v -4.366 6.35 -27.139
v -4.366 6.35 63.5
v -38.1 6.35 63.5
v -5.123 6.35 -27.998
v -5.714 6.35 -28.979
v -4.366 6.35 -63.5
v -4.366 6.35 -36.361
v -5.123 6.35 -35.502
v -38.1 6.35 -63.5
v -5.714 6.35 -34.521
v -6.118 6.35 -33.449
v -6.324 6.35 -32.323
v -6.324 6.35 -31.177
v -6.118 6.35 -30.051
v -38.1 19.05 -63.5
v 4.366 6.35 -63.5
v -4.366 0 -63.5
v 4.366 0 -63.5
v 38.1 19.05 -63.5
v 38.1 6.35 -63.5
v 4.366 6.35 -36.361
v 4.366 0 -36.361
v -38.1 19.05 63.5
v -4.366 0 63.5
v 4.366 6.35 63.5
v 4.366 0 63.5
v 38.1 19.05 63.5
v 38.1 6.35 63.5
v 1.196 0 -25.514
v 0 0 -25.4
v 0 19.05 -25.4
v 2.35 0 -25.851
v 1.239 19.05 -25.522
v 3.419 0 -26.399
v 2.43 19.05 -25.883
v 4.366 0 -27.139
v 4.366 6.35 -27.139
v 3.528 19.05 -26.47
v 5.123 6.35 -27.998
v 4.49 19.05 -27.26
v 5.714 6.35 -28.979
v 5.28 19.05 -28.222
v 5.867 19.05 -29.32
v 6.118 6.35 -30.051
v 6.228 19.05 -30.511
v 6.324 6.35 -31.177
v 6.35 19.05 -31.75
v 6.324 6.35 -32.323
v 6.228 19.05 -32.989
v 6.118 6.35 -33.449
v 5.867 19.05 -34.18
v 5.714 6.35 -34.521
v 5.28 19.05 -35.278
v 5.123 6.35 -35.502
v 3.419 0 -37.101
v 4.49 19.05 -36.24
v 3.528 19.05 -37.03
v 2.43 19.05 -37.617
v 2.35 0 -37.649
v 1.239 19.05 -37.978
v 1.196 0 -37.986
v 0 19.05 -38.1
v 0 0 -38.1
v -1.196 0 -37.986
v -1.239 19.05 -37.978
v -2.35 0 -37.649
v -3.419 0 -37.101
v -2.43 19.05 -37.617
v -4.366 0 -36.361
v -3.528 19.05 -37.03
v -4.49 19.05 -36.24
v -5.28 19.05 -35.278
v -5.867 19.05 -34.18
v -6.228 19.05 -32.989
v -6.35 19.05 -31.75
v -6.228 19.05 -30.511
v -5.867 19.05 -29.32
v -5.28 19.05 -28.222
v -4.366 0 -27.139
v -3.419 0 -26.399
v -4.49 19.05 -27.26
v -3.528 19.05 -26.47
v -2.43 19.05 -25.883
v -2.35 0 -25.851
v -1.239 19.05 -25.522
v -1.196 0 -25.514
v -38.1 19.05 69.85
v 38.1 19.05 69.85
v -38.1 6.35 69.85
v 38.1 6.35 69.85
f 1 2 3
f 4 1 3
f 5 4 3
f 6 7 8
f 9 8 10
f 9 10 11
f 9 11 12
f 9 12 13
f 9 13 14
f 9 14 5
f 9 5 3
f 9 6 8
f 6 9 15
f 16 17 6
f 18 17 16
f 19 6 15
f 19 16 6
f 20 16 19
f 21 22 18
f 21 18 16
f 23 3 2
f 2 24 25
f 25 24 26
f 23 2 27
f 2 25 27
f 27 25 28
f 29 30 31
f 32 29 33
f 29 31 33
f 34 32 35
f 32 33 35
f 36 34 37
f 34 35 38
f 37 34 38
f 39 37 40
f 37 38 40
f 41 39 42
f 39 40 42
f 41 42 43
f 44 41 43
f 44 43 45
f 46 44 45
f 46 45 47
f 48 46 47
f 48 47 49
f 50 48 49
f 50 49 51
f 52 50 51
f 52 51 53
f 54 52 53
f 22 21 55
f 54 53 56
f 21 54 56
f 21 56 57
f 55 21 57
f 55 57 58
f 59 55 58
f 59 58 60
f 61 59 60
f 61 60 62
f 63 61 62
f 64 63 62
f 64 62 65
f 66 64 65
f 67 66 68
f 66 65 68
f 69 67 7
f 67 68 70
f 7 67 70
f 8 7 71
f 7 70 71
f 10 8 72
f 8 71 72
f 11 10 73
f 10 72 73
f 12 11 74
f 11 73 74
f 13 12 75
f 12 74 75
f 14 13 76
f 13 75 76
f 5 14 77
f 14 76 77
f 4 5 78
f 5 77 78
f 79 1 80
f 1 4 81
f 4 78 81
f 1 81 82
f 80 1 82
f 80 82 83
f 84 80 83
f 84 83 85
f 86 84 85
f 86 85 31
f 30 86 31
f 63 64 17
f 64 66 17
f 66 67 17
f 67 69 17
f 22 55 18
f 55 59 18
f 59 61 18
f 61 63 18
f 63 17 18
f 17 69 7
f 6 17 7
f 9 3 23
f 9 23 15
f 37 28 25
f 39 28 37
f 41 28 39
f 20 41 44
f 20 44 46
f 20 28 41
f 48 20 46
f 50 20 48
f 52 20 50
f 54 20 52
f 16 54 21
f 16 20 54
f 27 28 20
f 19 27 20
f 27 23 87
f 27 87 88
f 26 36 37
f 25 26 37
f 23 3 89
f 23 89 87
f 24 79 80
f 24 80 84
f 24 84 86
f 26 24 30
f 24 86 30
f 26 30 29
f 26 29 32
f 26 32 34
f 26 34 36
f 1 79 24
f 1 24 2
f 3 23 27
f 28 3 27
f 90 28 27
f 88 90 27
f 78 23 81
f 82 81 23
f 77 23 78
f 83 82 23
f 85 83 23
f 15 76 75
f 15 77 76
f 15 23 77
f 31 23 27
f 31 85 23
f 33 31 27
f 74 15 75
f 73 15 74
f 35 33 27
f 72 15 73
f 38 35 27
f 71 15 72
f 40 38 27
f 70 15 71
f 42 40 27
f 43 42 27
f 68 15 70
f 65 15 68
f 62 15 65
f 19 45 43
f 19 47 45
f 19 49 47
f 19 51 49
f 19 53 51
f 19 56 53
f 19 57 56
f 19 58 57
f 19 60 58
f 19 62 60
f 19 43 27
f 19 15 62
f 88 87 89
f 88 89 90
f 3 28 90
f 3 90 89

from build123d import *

# Parameters (mm, degrees)
SKETCH1_W           = 76.2
SKETCH1_H           = 127
BOSS_EXTRUDE1_DEPTH = 19.05
SKETCH2_R           = 6.35
CUT_EXTRUDE1_DEPTH  = 77.464125575
SKETCH3_W           = 76.2
SKETCH3_H           = 19.05
BOSS_EXTRUDE2_DEPTH = 6.35
SKETCH4_W           = 33.734375
SKETCH4_H           = 6.35
CUT_EXTRUDE2_DEPTH  = 140.9883388
SKETCH5_W           = 8.73125
SKETCH5_H           = 6.35
CUT_EXTRUDE3_DEPTH  = 6.35


with BuildPart() as part:
    # Sketch1 → Boss-Extrude1 (new body)
    with BuildSketch(Plane(origin=(0, 0, 0), x_dir=(1, 0, 0), z_dir=(0, 1, 0))):
        Rectangle(SKETCH1_W, SKETCH1_H)
    extrude(amount=BOSS_EXTRUDE1_DEPTH)

    # Sketch2 → Cut-Extrude1 (cut, through all)
    with BuildSketch(Plane(origin=(0, 19.05, 0), x_dir=(1, 0, 0), z_dir=(0, 1, 0))):
        with Locations(Location((0, 31.75, 0), (0, 0, 270))):
            Circle(SKETCH2_R)
    extrude(amount=-CUT_EXTRUDE1_DEPTH, mode=Mode.SUBTRACT)


with BuildPart() as body_2:
    # Sketch3 → Boss-Extrude2 (new body)
    with BuildSketch(Plane.XY.offset(63.5)):
        with Locations((0, 9.525)):
            Rectangle(SKETCH3_W, SKETCH3_H)
    extrude(amount=BOSS_EXTRUDE2_DEPTH)


with BuildPart() as cut_extrude2_tool:
    # Sketch4 → Cut-Extrude2 (new, through all)
    with BuildSketch(Plane(origin=(0, 0, -63.5), x_dir=(-1, 0, 0), z_dir=(0, 0, -1))):
        with Locations((-21.2328125, 3.175)):
            Rectangle(SKETCH4_W, SKETCH4_H)
        with Locations((21.2328125, 3.175)):
            Rectangle(SKETCH4_W, SKETCH4_H)
    extrude(amount=-CUT_EXTRUDE2_DEPTH)


with BuildPart() as part_1:
    add(part.part)

    # Cut-Extrude2: cut by cut_extrude2_tool
    add(cut_extrude2_tool.part, mode=Mode.SUBTRACT)


with BuildPart() as body_2_1:
    add(body_2.part)

    # Cut-Extrude2: cut by cut_extrude2_tool
    add(cut_extrude2_tool.part, mode=Mode.SUBTRACT)

    # Sketch5 → Cut-Extrude3 (cut)
    with BuildSketch(Plane.XY.offset(69.85)):
        with Locations((0, 3.175)):
            Rectangle(SKETCH5_W, SKETCH5_H)
    extrude(amount=-CUT_EXTRUDE3_DEPTH, mode=Mode.SUBTRACT)


solid = Compound([part_1.part, body_2_1.part])
